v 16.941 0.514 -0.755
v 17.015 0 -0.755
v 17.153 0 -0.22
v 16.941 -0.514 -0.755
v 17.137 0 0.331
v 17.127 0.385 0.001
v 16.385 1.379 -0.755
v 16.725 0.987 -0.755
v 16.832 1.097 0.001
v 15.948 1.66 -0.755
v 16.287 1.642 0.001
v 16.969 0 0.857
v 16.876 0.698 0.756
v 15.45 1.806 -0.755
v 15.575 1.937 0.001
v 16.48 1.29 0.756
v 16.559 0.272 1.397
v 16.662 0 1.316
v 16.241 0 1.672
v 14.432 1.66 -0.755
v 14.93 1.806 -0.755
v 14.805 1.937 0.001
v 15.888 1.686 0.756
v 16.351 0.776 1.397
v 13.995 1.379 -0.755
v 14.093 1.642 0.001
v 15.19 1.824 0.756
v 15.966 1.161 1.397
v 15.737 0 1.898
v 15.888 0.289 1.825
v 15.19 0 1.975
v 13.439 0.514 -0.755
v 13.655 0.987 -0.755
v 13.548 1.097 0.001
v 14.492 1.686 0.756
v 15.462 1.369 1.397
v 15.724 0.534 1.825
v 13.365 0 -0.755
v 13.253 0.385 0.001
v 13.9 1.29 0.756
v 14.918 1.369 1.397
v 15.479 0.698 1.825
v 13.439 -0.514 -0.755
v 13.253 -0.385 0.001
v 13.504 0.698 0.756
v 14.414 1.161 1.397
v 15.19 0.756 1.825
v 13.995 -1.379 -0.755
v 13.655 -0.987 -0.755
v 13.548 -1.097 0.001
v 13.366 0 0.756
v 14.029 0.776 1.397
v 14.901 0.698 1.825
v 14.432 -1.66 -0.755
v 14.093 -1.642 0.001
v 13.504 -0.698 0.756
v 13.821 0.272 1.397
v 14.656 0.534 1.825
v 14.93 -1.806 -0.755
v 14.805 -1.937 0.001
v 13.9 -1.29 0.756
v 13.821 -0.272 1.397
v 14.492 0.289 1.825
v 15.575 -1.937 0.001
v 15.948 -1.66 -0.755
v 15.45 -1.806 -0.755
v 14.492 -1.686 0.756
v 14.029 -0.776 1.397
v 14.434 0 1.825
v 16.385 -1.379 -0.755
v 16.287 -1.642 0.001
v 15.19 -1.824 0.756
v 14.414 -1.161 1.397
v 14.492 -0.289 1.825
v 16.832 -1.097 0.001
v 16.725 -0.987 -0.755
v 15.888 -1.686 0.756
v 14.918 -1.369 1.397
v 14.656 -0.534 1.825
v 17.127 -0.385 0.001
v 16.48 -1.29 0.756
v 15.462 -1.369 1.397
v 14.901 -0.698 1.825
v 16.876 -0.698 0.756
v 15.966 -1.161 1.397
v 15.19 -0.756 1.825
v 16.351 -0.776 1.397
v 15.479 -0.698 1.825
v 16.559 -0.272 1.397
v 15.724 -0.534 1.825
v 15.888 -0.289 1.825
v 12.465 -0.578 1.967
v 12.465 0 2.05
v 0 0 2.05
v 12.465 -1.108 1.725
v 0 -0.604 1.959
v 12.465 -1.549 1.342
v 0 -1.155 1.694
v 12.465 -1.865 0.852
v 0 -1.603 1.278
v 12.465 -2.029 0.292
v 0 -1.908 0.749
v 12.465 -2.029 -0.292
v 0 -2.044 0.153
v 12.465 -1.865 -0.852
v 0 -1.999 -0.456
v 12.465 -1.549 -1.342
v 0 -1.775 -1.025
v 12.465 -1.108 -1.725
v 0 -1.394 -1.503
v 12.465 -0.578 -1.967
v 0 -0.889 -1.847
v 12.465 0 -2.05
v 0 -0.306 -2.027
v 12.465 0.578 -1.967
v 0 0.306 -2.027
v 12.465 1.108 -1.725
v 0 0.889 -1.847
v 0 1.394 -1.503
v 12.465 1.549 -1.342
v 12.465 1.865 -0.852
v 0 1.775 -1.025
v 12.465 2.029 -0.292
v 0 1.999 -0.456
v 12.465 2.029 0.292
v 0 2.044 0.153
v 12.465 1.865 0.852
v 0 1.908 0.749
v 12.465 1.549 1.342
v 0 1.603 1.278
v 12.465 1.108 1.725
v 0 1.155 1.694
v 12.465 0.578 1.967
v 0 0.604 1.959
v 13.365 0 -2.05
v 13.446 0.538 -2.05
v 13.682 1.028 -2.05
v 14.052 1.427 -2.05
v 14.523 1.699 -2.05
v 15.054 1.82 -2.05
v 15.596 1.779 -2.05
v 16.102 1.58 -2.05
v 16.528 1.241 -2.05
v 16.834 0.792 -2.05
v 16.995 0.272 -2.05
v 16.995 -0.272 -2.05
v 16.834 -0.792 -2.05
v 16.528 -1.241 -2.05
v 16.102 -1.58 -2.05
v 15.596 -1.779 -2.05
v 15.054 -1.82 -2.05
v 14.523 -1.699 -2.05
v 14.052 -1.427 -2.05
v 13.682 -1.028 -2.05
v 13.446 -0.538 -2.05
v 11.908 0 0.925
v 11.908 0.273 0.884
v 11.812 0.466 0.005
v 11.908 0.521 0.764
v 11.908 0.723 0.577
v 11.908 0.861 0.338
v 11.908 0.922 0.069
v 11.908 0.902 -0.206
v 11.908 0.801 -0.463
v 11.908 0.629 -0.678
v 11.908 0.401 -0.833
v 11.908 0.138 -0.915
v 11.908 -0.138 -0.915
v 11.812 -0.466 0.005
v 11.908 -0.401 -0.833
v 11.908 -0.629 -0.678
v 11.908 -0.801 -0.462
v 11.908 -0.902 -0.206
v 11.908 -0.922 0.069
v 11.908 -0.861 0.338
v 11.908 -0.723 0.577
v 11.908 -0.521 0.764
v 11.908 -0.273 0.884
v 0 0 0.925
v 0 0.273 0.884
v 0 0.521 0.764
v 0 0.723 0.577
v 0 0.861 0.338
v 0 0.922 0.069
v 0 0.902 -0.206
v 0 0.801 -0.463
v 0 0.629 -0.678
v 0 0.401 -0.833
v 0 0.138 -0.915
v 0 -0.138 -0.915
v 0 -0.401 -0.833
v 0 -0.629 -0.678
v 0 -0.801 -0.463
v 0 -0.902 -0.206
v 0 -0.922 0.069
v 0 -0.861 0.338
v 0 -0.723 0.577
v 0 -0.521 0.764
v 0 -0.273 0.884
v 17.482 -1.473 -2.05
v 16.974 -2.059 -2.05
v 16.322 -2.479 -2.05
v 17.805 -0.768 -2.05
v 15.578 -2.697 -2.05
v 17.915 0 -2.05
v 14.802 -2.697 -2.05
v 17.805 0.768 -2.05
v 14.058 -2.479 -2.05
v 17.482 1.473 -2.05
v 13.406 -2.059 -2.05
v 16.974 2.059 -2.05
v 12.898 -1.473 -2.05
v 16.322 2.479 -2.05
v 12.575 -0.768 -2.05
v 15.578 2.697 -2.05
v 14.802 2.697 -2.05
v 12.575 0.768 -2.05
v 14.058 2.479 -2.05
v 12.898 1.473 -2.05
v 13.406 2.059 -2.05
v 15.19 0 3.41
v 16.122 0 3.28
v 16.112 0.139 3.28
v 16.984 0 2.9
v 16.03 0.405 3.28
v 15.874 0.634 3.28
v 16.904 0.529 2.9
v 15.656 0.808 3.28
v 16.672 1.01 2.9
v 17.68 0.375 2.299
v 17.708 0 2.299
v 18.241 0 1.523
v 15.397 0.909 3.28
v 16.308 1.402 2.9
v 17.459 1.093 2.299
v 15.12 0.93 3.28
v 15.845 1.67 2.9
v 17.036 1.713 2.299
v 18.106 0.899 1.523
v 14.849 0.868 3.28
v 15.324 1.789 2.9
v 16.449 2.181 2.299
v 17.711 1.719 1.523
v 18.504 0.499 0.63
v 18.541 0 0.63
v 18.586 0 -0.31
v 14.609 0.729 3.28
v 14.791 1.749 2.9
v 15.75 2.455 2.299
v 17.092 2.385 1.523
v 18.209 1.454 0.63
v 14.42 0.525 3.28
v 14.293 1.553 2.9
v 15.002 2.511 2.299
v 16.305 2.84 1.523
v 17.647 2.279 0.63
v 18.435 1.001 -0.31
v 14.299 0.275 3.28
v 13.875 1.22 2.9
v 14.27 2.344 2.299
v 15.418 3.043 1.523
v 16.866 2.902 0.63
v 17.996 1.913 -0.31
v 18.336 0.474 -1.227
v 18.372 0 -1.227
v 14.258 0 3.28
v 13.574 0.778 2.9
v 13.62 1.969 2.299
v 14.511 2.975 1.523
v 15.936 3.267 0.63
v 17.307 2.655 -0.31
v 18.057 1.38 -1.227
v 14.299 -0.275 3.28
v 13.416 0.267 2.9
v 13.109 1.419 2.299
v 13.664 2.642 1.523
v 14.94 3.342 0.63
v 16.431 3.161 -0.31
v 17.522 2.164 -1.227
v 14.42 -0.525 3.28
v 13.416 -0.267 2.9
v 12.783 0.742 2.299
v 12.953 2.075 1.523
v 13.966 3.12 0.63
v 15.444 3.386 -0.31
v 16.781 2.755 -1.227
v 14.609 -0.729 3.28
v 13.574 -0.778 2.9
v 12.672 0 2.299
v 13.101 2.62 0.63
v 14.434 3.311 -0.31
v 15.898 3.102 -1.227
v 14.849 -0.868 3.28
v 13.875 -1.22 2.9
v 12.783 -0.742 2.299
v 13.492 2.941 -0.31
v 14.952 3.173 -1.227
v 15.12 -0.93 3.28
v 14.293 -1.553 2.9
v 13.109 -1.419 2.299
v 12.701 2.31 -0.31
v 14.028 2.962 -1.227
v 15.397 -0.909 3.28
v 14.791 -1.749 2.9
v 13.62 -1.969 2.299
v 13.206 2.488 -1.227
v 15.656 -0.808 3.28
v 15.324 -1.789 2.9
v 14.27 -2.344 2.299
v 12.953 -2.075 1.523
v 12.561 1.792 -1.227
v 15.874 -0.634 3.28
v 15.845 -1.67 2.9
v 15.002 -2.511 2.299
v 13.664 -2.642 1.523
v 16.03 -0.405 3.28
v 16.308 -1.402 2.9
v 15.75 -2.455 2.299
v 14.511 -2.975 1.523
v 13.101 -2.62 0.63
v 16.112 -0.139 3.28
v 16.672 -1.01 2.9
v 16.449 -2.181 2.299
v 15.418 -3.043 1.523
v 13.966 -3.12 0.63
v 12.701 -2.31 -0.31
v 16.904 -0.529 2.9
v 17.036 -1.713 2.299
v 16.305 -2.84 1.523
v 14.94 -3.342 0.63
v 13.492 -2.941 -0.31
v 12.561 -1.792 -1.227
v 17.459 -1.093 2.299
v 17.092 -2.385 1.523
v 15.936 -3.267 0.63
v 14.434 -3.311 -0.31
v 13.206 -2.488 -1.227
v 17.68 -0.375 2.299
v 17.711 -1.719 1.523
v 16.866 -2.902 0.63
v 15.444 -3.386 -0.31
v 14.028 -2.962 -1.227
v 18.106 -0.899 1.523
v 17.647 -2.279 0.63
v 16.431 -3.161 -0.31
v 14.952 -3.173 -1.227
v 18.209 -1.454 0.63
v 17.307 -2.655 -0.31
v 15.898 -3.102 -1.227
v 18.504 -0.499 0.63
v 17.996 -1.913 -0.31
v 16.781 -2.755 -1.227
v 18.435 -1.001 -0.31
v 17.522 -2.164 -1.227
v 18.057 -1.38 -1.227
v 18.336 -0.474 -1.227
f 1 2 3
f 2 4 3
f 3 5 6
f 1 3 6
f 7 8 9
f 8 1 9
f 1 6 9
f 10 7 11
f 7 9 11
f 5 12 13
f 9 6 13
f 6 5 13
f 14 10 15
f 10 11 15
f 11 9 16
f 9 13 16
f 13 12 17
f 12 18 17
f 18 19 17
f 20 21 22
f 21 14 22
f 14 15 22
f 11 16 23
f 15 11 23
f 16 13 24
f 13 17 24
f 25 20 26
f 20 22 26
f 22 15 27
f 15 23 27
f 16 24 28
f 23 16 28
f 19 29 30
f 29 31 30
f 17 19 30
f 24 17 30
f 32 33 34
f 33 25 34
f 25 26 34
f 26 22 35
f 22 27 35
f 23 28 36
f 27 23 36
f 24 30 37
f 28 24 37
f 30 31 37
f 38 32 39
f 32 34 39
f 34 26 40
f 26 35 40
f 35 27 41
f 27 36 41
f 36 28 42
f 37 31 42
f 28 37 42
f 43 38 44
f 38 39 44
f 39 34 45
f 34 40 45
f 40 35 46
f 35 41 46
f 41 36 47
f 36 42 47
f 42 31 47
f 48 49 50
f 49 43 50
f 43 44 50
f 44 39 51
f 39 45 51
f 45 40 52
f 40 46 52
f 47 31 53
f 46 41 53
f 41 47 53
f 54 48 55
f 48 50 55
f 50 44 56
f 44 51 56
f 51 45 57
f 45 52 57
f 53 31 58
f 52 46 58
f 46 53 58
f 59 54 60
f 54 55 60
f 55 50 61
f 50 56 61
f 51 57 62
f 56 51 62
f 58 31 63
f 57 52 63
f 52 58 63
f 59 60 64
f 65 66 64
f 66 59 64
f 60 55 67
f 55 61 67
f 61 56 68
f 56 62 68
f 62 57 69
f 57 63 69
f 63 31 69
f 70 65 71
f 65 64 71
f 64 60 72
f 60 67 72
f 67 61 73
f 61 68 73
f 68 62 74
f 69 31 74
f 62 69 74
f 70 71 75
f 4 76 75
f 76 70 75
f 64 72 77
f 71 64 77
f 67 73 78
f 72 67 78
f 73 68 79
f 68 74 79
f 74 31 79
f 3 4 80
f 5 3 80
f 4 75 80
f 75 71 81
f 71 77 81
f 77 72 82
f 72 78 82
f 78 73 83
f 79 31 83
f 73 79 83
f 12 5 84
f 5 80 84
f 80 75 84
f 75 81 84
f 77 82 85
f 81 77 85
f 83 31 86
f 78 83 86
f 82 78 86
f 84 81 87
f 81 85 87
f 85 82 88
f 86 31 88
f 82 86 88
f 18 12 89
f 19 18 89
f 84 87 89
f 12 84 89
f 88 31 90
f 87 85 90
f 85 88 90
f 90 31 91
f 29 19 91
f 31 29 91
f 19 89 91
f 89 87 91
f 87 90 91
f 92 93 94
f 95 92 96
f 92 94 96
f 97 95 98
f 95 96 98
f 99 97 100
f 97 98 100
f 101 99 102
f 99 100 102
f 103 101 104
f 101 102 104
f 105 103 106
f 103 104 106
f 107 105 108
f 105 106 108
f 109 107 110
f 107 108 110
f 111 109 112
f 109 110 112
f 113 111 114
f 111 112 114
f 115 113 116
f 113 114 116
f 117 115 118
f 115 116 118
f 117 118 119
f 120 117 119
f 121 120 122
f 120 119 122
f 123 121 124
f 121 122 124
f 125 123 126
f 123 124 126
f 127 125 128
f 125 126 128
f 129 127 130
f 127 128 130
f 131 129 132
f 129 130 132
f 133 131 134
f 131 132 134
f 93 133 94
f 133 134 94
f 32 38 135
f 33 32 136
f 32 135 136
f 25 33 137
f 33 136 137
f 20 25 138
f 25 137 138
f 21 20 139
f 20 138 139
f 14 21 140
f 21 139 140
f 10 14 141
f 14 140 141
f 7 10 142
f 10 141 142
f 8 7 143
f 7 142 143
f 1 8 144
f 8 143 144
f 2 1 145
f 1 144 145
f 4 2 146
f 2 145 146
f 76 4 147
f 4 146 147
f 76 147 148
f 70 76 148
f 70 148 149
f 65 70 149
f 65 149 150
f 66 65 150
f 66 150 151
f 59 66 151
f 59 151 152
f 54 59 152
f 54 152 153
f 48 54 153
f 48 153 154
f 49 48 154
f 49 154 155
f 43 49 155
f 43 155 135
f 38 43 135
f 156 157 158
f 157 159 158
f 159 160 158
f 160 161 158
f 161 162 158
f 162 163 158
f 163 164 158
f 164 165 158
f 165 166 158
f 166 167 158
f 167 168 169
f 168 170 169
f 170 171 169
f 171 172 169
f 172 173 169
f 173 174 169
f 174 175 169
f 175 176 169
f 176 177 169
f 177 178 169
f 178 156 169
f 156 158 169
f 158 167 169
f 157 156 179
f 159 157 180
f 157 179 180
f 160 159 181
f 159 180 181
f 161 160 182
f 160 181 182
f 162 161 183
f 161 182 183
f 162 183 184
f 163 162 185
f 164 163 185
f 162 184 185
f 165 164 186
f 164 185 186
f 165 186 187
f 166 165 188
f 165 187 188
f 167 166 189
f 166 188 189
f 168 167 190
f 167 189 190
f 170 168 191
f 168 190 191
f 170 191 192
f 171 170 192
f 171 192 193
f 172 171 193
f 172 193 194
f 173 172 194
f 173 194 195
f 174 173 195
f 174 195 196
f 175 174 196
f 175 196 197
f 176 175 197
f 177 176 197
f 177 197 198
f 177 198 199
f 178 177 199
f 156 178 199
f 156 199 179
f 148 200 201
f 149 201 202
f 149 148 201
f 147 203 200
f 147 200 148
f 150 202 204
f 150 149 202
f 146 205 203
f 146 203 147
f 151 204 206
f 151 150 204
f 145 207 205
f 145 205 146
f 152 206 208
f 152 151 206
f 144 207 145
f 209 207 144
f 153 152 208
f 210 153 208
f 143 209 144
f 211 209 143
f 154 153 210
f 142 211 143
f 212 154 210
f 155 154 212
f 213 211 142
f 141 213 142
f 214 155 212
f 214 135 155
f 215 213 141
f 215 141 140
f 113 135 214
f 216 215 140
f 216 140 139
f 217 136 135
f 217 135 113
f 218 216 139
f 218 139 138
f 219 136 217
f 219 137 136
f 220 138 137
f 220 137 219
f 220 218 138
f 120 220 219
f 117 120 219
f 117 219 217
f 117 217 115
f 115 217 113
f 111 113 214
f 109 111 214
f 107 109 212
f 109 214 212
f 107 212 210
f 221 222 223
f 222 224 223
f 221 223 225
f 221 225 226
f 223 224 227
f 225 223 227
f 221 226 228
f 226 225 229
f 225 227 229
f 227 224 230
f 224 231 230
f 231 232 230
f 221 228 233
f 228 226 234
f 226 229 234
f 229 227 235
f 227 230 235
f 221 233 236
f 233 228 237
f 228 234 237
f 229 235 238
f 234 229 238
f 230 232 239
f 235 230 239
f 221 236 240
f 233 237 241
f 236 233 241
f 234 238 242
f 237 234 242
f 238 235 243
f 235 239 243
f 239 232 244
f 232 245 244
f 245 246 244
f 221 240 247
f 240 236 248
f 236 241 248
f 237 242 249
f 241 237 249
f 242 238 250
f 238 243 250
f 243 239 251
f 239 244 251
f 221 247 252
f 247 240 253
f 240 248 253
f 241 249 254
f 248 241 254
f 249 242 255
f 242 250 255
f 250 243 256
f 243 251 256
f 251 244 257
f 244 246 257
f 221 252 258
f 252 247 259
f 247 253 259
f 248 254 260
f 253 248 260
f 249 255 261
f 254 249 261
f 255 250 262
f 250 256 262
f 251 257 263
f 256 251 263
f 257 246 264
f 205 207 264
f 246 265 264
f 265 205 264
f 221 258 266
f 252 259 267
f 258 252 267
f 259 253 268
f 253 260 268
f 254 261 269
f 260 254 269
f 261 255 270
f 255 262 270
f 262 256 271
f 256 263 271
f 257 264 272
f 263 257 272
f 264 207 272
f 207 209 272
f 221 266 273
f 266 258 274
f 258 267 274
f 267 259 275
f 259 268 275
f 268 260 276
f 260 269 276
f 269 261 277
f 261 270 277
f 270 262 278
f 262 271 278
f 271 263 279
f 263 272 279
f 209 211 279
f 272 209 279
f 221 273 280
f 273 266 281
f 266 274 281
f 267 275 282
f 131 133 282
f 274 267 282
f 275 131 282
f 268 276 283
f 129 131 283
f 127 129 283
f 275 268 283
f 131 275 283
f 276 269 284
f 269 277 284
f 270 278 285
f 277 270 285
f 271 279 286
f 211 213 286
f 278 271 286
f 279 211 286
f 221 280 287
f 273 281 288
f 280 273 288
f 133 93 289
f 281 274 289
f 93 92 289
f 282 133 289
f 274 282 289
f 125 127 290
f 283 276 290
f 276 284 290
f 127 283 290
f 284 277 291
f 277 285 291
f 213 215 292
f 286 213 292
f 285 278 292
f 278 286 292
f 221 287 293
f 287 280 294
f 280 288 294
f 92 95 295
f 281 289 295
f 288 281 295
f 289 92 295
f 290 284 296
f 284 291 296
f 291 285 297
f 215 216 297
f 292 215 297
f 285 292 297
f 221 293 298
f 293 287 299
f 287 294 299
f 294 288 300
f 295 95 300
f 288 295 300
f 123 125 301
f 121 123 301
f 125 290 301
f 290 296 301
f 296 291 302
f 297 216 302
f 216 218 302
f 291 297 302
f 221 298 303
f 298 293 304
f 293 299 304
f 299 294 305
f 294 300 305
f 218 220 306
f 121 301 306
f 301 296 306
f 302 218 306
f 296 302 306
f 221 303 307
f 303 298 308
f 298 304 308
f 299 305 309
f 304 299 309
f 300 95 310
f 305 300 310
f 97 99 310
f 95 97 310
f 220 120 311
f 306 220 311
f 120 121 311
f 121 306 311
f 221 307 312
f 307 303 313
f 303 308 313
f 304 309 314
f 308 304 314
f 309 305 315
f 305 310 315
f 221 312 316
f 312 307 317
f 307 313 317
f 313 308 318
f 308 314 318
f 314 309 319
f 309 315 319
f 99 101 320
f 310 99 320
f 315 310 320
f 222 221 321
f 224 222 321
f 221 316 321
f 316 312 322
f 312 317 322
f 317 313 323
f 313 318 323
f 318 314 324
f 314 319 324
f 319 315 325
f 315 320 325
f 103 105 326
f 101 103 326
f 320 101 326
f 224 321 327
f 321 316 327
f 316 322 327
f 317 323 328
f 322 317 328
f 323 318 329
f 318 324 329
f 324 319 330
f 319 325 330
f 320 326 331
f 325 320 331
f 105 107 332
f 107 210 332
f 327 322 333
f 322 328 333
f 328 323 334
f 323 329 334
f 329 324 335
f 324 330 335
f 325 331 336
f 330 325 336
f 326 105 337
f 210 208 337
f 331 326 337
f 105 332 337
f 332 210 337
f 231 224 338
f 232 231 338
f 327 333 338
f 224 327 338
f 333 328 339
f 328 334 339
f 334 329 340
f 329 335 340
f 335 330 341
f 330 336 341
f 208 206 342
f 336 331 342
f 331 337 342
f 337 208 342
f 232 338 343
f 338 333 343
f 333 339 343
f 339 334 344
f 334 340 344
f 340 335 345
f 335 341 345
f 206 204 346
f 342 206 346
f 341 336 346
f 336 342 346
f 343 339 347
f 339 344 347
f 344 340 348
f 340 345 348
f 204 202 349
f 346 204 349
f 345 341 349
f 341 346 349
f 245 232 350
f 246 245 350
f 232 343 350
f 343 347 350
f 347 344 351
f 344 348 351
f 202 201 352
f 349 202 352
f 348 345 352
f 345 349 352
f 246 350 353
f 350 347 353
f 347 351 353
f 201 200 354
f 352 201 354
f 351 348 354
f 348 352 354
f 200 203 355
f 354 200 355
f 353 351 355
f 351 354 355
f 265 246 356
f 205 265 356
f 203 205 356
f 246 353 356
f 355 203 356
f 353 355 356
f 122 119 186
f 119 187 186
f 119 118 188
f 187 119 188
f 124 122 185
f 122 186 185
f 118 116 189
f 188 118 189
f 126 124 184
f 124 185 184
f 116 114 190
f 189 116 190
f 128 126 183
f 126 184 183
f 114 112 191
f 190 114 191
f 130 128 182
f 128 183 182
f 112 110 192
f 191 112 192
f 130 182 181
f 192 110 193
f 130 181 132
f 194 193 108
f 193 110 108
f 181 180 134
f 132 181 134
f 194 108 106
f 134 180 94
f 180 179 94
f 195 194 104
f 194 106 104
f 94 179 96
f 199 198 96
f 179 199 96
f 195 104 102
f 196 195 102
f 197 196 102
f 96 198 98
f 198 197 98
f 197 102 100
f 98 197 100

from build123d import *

# Parameters (mm, degrees)
SCHIZZO2_R                    = 2.05
ESTRUSIONE_ESTRUSIONE1_DEPTH  = 13
SCHIZZO3_R                    = 0.925
TAGLIO_ESTRUSIONE1_DEPTH      = 12
TAGLIO_ESTRUSIONE2_REACH      = 21.682
TAGLIO_ESTRUSIONE2_END_RADIUS = 1.975
SCHIZZO5_R                    = 1.825


with BuildPart() as part:
    # Schizzo2 → Estrusione-Estrusione1 (new body)
    with BuildSketch(Plane(origin=(0, 0, 0), x_dir=(0, 0, -1), z_dir=(1, 0, 0))):
        with Locations(Location((0, 0, 0), (0, 0, 180))):
            Circle(SCHIZZO2_R)
    extrude(amount=ESTRUSIONE_ESTRUSIONE1_DEPTH)

    # Schizzo3 → Taglio-Estrusione1 (cut)
    with BuildSketch(Plane.ZY):
        Circle(SCHIZZO3_R)
    extrude(amount=-TAGLIO_ESTRUSIONE1_DEPTH, mode=Mode.SUBTRACT)

    # Schizzo4 → Rivoluzione1 (revolve)
    with BuildSketch(Plane(origin=(0, 0, 0), x_dir=(1, 0, 0), z_dir=(0, 1, 0))):
        with BuildLine():
            Line((15.19, 3.41), (15.19, 1.975))
            ThreePointArc((15.19, 1.975), (17.165, 0), (15.19, -1.975))
            Line((15.19, -1.975), (15.19, -3.41))
            ThreePointArc((15.19, -3.41), (18.6, 0), (15.19, 3.41))
        make_face()
    revolve(axis=Axis((15.19, 0, 1.975), (0, 0, 1)))

    # TaglioSuperficie1
    split(bisect_by=Plane(origin=(0, 0, -2.05), x_dir=(-1, 0, 0), z_dir=(0, 0, -1)), keep=Keep.BOTTOM)

    # Taglio-Estrusione2: up to this sphere (the profile starts outside it)
    taglio_estrusione2_end = Location((15.19, 0, 0)) * Sphere(TAGLIO_ESTRUSIONE2_END_RADIUS, mode=Mode.PRIVATE)
    # Schizzo5 → Taglio-Estrusione2 (cut, up to the surface)
    with BuildSketch(Plane(origin=(0, 0, -2.05), x_dir=(-1, 0, 0), z_dir=(0, 0, -1)), mode=Mode.PRIVATE) as taglio_estrusione2_sk1:
        with Locations((-15.19, 0)):
            Circle(SCHIZZO5_R)
    taglio_estrusione2_tool1 = extrude(taglio_estrusione2_sk1.sketch, amount=-TAGLIO_ESTRUSIONE2_REACH, mode=Mode.PRIVATE) - taglio_estrusione2_end
    add(taglio_estrusione2_tool1.solids().sort_by_distance((15.19, 0, -2.05))[0], mode=Mode.SUBTRACT)


solid = part.part
